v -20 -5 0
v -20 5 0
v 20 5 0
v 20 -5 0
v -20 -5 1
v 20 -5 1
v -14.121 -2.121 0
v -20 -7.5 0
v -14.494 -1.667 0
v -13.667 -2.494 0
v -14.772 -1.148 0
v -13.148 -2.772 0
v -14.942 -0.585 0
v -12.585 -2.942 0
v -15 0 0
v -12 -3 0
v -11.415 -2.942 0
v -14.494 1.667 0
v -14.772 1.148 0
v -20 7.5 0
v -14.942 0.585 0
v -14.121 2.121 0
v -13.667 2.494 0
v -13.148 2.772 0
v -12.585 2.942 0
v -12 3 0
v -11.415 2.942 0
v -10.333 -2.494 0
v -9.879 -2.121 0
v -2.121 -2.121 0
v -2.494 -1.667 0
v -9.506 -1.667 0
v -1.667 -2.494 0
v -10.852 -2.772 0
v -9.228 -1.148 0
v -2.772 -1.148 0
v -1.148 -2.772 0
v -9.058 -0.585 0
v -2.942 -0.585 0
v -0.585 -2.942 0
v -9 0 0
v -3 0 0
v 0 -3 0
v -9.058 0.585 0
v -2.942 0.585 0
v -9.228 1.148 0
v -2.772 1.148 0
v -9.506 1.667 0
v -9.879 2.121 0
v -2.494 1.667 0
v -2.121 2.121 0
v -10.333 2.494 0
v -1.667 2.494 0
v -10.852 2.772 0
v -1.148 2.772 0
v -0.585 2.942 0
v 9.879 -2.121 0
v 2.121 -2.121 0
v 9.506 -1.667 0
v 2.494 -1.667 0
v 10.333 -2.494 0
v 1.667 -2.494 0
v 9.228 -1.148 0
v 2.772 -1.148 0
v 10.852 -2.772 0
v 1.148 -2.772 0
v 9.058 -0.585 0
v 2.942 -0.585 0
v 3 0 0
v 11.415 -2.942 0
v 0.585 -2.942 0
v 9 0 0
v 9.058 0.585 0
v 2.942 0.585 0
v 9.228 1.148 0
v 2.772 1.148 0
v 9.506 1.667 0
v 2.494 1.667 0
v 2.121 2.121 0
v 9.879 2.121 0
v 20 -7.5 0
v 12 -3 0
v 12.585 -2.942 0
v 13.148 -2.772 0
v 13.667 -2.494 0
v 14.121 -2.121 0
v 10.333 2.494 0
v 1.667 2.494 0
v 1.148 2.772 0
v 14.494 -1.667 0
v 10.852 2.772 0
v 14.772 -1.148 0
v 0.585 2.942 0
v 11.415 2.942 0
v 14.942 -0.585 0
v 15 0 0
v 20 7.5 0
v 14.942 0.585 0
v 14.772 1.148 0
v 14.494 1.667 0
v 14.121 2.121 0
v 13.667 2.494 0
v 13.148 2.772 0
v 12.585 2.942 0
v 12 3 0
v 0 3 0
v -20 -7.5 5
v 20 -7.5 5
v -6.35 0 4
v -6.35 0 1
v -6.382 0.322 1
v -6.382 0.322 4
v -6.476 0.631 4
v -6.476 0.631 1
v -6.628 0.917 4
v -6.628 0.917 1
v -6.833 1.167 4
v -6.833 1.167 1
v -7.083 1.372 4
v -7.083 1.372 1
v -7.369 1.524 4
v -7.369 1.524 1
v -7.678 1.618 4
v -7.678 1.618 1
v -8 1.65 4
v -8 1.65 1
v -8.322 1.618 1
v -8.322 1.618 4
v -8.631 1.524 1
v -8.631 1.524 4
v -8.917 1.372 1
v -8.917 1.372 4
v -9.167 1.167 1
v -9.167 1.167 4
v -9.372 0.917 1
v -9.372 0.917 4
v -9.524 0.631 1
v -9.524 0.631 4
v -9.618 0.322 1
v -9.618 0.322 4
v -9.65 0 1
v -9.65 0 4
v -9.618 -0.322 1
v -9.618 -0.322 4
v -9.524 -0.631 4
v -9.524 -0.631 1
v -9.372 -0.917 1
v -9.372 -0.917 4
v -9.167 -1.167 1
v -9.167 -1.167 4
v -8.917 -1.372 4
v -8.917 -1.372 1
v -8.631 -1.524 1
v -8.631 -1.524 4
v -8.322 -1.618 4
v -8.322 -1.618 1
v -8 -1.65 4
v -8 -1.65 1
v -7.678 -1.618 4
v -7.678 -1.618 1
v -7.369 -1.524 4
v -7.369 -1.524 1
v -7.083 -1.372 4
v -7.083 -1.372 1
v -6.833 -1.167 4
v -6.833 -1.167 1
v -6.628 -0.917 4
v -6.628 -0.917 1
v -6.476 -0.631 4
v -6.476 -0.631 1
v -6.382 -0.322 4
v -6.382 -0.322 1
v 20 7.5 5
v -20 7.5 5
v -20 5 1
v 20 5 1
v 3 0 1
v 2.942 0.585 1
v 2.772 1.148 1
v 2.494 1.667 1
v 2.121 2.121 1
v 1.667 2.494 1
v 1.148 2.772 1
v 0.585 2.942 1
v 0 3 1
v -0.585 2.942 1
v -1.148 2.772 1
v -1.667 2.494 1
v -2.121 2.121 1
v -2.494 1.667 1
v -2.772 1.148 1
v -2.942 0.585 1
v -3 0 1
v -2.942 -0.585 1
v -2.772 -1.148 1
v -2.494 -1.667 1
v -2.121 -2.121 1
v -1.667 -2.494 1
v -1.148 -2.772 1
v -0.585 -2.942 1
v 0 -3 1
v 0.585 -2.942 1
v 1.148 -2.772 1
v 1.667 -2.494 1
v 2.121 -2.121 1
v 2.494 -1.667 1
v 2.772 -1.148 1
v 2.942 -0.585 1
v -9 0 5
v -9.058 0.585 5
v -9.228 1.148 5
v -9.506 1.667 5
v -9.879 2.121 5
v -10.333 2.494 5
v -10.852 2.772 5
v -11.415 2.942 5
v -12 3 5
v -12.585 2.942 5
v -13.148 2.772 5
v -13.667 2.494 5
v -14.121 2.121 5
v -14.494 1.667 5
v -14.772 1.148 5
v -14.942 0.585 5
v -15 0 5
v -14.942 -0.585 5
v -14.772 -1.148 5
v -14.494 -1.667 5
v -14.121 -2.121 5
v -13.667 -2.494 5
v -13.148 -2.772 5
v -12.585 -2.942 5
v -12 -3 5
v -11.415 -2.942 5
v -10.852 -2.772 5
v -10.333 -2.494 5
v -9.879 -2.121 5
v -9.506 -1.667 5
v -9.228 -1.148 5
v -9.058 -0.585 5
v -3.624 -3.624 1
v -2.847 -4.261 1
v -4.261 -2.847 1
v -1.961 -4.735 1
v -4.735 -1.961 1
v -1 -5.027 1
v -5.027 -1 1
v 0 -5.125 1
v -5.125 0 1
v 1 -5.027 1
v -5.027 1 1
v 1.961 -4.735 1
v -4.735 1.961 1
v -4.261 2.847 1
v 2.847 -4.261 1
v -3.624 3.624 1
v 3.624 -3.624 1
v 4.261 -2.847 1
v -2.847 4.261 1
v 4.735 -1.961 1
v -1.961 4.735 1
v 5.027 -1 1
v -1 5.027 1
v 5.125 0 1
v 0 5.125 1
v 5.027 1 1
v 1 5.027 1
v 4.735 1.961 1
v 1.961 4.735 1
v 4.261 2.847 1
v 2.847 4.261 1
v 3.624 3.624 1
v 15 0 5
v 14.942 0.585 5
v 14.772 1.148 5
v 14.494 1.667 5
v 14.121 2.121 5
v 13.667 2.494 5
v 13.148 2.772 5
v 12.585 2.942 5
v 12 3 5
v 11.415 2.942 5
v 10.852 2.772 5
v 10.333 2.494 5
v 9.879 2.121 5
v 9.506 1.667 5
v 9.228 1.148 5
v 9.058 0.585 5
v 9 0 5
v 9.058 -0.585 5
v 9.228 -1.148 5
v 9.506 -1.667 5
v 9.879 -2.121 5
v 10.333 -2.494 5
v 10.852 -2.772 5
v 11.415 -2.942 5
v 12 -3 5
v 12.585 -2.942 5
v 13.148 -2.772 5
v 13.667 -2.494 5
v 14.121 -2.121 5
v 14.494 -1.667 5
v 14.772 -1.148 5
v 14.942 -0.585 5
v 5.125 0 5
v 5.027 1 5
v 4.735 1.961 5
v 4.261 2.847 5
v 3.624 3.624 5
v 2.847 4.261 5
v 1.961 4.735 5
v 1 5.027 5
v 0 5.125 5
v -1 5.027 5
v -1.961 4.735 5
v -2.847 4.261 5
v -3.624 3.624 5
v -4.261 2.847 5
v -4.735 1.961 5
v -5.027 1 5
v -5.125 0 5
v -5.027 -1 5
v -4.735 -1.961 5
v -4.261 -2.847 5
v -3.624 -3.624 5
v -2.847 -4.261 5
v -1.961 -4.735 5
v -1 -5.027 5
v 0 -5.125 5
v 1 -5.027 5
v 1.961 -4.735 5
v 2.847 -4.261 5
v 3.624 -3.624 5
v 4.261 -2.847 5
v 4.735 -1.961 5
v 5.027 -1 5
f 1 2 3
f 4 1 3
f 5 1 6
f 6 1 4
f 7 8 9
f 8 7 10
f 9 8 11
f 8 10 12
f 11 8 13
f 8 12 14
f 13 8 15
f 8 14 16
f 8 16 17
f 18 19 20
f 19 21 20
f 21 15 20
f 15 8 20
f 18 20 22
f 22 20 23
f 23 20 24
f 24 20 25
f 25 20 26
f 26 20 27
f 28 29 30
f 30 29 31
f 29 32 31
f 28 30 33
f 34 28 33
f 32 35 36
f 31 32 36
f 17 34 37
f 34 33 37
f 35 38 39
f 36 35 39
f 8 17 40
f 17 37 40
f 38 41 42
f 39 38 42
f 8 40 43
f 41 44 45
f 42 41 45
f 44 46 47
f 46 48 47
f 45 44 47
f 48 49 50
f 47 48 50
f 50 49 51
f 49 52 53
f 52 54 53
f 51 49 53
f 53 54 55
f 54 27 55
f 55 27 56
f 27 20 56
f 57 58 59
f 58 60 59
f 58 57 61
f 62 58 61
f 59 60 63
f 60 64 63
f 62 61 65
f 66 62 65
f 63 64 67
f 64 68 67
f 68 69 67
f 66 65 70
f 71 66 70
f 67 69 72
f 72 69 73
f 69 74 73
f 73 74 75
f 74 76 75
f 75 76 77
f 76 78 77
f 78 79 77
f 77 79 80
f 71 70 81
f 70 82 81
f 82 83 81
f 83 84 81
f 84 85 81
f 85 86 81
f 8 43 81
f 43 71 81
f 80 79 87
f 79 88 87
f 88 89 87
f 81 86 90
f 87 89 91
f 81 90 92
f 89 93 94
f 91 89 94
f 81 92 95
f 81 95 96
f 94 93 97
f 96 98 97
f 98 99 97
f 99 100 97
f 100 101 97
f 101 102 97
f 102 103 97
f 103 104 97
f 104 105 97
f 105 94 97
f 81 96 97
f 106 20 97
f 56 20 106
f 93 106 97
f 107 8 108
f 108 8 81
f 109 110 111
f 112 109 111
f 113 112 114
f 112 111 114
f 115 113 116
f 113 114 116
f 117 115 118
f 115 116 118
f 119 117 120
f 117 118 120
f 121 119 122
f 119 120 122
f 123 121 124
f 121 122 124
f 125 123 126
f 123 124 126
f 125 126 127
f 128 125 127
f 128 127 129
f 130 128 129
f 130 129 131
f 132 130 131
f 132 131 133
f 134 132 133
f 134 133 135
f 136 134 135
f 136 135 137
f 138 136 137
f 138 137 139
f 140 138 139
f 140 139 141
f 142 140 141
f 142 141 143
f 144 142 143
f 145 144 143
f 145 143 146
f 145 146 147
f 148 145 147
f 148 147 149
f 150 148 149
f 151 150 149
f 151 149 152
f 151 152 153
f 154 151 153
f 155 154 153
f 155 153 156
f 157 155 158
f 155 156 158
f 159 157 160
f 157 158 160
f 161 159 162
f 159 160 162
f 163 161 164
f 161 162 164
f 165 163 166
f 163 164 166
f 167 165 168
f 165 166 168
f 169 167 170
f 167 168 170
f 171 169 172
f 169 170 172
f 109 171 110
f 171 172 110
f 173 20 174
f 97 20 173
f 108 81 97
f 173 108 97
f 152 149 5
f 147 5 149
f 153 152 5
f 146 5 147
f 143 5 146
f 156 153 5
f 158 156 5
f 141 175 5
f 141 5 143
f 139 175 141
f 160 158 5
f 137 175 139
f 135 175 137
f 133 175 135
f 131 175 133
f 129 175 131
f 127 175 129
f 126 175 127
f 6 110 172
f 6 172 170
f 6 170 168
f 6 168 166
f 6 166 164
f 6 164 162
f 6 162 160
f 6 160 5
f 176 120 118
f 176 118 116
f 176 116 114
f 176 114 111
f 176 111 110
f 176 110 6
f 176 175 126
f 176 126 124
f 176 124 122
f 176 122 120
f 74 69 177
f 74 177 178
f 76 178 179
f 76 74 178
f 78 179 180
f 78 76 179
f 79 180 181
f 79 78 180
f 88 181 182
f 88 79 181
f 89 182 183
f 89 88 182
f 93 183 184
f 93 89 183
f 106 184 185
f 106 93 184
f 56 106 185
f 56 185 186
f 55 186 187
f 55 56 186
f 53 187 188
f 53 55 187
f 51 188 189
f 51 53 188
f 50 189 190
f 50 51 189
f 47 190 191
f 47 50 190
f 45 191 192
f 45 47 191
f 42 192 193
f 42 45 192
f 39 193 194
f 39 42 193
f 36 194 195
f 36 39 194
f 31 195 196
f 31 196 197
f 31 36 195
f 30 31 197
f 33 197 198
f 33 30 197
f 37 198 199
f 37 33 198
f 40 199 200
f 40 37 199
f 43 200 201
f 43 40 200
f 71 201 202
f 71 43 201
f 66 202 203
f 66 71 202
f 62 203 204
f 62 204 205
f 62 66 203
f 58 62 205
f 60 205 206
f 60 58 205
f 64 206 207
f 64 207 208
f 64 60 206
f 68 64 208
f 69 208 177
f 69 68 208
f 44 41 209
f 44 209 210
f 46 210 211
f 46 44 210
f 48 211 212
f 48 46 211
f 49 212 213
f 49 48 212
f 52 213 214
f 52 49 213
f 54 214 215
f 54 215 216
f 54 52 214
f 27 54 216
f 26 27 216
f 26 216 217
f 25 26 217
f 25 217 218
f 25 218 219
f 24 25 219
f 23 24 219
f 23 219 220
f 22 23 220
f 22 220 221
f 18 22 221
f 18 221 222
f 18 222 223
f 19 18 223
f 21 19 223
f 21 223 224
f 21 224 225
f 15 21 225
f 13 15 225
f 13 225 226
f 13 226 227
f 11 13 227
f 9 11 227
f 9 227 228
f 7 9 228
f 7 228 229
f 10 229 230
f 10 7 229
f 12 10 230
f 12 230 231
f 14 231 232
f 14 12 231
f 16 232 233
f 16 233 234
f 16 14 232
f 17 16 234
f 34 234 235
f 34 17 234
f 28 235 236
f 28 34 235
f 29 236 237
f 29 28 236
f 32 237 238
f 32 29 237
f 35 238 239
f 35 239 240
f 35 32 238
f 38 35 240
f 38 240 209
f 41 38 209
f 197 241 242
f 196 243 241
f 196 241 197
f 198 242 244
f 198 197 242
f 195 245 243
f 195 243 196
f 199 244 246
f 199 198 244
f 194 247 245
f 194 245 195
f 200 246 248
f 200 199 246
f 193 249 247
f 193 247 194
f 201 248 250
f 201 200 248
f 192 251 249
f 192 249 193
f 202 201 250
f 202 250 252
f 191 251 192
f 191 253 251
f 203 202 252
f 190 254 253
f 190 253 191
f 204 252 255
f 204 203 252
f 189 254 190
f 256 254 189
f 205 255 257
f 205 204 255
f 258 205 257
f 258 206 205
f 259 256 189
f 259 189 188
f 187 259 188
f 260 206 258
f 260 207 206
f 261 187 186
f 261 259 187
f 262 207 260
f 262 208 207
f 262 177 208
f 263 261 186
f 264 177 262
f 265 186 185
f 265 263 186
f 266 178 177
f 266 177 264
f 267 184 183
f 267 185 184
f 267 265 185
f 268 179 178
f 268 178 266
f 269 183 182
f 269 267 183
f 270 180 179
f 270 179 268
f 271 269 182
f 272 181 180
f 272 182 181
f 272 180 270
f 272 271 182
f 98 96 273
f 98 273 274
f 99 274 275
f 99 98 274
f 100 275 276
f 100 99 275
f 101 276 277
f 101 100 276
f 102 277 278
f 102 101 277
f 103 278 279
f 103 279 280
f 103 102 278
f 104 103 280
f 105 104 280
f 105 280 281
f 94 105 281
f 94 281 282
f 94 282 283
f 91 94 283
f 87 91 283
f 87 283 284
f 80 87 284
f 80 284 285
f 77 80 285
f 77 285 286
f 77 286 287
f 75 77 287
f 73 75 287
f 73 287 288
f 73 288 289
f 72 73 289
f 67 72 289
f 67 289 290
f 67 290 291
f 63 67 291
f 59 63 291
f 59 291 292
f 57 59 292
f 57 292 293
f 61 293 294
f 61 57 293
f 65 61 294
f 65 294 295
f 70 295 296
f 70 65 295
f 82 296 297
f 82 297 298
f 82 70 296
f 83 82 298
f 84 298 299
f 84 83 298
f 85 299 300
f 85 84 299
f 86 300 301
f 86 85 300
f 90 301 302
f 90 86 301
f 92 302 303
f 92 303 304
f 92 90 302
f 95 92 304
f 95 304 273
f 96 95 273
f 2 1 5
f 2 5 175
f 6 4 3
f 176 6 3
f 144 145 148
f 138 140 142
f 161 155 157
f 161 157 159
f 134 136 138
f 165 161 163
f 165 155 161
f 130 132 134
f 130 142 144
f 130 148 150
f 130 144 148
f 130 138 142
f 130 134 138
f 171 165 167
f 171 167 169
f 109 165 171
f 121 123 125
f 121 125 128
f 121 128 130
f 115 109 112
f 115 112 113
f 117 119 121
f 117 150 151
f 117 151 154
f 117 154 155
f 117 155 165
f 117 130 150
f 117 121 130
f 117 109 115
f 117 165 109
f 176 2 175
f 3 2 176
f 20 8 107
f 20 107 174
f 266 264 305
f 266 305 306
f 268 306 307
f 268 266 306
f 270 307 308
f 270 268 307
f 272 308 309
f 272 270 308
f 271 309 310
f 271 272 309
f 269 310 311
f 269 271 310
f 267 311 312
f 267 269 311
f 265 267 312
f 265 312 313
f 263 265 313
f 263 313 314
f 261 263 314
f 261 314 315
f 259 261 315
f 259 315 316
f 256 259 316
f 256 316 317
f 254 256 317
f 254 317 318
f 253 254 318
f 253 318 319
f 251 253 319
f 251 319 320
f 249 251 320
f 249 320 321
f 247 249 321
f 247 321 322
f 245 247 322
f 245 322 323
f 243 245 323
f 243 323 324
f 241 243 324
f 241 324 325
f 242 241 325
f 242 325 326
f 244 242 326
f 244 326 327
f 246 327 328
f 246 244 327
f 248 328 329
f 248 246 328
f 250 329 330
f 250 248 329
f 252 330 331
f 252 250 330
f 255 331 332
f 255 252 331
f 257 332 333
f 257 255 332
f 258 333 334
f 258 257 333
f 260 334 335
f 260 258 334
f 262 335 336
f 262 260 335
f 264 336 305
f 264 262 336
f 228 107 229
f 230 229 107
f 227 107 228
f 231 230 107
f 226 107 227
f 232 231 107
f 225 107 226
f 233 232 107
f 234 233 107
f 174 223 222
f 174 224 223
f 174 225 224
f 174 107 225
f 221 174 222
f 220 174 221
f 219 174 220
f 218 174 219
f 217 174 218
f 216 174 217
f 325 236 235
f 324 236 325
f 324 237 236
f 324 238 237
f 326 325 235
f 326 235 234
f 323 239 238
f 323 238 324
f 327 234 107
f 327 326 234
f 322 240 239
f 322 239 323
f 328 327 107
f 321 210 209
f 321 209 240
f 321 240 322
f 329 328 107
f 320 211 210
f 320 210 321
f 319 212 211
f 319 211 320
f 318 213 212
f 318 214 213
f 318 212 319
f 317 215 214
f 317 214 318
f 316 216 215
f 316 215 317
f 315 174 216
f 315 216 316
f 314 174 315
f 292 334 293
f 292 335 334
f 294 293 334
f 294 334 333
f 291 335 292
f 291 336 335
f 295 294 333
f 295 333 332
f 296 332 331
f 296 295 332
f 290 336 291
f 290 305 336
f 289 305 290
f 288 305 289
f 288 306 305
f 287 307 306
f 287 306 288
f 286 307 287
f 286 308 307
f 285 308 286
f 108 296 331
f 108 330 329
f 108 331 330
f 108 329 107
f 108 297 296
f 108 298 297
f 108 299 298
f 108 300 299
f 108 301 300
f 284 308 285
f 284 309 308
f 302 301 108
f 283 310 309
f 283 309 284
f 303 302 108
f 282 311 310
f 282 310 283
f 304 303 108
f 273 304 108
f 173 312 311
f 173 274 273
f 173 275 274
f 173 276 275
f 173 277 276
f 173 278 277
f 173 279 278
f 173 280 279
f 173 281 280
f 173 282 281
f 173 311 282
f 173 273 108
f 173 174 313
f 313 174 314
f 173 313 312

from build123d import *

# Parameters (mm, degrees)
F0_W     = 40
F0_H     = 15
F0_R     = 3
F0_R_2   = 5.125
F1_DEPTH = 1
F2_DEPTH = 5
F3_W     = 40
F3_H     = 10
F3_R     = 1.65
F4_DEPTH = 1
F5_DEPTH = 4


with BuildPart() as f1:
    # F0 (on Top) → F1 (new body)
    with BuildSketch(Plane.XY):
        Rectangle(F0_W, F0_H)
        with Locations((-12, 0)):
            Circle(F0_R, mode=Mode.SUBTRACT)
        Circle(F0_R_2, mode=Mode.SUBTRACT)
        with Locations((12, 0)):
            Circle(F0_R, mode=Mode.SUBTRACT)
        Circle(F0_R_2)
        Circle(F0_R, mode=Mode.SUBTRACT)
    extrude(amount=F1_DEPTH)

    # F0 (on Top) → F2 (join)
    with BuildSketch(Plane.XY):
        Rectangle(F0_W, F0_H)
        with Locations((-12, 0)):
            Circle(F0_R, mode=Mode.SUBTRACT)
        Circle(F0_R_2, mode=Mode.SUBTRACT)
        with Locations((12, 0)):
            Circle(F0_R, mode=Mode.SUBTRACT)
    extrude(amount=F2_DEPTH)


with BuildPart() as f4:
    # F3 (on Top) → F4 (new body)
    with BuildSketch(Plane.XY):
        Rectangle(F3_W, F3_H)
        with Locations((-8, 0)):
            Circle(F3_R, mode=Mode.SUBTRACT)
        with Locations((-8, 0)):
            Circle(F3_R)
    extrude(amount=F4_DEPTH)

    # F3 (on Top) → F5 (join)
    with BuildSketch(Plane.XY):
        with Locations((-8, 0)):
            Circle(F3_R)
    extrude(amount=F5_DEPTH)


solid = Compound([f1.part, f4.part])
